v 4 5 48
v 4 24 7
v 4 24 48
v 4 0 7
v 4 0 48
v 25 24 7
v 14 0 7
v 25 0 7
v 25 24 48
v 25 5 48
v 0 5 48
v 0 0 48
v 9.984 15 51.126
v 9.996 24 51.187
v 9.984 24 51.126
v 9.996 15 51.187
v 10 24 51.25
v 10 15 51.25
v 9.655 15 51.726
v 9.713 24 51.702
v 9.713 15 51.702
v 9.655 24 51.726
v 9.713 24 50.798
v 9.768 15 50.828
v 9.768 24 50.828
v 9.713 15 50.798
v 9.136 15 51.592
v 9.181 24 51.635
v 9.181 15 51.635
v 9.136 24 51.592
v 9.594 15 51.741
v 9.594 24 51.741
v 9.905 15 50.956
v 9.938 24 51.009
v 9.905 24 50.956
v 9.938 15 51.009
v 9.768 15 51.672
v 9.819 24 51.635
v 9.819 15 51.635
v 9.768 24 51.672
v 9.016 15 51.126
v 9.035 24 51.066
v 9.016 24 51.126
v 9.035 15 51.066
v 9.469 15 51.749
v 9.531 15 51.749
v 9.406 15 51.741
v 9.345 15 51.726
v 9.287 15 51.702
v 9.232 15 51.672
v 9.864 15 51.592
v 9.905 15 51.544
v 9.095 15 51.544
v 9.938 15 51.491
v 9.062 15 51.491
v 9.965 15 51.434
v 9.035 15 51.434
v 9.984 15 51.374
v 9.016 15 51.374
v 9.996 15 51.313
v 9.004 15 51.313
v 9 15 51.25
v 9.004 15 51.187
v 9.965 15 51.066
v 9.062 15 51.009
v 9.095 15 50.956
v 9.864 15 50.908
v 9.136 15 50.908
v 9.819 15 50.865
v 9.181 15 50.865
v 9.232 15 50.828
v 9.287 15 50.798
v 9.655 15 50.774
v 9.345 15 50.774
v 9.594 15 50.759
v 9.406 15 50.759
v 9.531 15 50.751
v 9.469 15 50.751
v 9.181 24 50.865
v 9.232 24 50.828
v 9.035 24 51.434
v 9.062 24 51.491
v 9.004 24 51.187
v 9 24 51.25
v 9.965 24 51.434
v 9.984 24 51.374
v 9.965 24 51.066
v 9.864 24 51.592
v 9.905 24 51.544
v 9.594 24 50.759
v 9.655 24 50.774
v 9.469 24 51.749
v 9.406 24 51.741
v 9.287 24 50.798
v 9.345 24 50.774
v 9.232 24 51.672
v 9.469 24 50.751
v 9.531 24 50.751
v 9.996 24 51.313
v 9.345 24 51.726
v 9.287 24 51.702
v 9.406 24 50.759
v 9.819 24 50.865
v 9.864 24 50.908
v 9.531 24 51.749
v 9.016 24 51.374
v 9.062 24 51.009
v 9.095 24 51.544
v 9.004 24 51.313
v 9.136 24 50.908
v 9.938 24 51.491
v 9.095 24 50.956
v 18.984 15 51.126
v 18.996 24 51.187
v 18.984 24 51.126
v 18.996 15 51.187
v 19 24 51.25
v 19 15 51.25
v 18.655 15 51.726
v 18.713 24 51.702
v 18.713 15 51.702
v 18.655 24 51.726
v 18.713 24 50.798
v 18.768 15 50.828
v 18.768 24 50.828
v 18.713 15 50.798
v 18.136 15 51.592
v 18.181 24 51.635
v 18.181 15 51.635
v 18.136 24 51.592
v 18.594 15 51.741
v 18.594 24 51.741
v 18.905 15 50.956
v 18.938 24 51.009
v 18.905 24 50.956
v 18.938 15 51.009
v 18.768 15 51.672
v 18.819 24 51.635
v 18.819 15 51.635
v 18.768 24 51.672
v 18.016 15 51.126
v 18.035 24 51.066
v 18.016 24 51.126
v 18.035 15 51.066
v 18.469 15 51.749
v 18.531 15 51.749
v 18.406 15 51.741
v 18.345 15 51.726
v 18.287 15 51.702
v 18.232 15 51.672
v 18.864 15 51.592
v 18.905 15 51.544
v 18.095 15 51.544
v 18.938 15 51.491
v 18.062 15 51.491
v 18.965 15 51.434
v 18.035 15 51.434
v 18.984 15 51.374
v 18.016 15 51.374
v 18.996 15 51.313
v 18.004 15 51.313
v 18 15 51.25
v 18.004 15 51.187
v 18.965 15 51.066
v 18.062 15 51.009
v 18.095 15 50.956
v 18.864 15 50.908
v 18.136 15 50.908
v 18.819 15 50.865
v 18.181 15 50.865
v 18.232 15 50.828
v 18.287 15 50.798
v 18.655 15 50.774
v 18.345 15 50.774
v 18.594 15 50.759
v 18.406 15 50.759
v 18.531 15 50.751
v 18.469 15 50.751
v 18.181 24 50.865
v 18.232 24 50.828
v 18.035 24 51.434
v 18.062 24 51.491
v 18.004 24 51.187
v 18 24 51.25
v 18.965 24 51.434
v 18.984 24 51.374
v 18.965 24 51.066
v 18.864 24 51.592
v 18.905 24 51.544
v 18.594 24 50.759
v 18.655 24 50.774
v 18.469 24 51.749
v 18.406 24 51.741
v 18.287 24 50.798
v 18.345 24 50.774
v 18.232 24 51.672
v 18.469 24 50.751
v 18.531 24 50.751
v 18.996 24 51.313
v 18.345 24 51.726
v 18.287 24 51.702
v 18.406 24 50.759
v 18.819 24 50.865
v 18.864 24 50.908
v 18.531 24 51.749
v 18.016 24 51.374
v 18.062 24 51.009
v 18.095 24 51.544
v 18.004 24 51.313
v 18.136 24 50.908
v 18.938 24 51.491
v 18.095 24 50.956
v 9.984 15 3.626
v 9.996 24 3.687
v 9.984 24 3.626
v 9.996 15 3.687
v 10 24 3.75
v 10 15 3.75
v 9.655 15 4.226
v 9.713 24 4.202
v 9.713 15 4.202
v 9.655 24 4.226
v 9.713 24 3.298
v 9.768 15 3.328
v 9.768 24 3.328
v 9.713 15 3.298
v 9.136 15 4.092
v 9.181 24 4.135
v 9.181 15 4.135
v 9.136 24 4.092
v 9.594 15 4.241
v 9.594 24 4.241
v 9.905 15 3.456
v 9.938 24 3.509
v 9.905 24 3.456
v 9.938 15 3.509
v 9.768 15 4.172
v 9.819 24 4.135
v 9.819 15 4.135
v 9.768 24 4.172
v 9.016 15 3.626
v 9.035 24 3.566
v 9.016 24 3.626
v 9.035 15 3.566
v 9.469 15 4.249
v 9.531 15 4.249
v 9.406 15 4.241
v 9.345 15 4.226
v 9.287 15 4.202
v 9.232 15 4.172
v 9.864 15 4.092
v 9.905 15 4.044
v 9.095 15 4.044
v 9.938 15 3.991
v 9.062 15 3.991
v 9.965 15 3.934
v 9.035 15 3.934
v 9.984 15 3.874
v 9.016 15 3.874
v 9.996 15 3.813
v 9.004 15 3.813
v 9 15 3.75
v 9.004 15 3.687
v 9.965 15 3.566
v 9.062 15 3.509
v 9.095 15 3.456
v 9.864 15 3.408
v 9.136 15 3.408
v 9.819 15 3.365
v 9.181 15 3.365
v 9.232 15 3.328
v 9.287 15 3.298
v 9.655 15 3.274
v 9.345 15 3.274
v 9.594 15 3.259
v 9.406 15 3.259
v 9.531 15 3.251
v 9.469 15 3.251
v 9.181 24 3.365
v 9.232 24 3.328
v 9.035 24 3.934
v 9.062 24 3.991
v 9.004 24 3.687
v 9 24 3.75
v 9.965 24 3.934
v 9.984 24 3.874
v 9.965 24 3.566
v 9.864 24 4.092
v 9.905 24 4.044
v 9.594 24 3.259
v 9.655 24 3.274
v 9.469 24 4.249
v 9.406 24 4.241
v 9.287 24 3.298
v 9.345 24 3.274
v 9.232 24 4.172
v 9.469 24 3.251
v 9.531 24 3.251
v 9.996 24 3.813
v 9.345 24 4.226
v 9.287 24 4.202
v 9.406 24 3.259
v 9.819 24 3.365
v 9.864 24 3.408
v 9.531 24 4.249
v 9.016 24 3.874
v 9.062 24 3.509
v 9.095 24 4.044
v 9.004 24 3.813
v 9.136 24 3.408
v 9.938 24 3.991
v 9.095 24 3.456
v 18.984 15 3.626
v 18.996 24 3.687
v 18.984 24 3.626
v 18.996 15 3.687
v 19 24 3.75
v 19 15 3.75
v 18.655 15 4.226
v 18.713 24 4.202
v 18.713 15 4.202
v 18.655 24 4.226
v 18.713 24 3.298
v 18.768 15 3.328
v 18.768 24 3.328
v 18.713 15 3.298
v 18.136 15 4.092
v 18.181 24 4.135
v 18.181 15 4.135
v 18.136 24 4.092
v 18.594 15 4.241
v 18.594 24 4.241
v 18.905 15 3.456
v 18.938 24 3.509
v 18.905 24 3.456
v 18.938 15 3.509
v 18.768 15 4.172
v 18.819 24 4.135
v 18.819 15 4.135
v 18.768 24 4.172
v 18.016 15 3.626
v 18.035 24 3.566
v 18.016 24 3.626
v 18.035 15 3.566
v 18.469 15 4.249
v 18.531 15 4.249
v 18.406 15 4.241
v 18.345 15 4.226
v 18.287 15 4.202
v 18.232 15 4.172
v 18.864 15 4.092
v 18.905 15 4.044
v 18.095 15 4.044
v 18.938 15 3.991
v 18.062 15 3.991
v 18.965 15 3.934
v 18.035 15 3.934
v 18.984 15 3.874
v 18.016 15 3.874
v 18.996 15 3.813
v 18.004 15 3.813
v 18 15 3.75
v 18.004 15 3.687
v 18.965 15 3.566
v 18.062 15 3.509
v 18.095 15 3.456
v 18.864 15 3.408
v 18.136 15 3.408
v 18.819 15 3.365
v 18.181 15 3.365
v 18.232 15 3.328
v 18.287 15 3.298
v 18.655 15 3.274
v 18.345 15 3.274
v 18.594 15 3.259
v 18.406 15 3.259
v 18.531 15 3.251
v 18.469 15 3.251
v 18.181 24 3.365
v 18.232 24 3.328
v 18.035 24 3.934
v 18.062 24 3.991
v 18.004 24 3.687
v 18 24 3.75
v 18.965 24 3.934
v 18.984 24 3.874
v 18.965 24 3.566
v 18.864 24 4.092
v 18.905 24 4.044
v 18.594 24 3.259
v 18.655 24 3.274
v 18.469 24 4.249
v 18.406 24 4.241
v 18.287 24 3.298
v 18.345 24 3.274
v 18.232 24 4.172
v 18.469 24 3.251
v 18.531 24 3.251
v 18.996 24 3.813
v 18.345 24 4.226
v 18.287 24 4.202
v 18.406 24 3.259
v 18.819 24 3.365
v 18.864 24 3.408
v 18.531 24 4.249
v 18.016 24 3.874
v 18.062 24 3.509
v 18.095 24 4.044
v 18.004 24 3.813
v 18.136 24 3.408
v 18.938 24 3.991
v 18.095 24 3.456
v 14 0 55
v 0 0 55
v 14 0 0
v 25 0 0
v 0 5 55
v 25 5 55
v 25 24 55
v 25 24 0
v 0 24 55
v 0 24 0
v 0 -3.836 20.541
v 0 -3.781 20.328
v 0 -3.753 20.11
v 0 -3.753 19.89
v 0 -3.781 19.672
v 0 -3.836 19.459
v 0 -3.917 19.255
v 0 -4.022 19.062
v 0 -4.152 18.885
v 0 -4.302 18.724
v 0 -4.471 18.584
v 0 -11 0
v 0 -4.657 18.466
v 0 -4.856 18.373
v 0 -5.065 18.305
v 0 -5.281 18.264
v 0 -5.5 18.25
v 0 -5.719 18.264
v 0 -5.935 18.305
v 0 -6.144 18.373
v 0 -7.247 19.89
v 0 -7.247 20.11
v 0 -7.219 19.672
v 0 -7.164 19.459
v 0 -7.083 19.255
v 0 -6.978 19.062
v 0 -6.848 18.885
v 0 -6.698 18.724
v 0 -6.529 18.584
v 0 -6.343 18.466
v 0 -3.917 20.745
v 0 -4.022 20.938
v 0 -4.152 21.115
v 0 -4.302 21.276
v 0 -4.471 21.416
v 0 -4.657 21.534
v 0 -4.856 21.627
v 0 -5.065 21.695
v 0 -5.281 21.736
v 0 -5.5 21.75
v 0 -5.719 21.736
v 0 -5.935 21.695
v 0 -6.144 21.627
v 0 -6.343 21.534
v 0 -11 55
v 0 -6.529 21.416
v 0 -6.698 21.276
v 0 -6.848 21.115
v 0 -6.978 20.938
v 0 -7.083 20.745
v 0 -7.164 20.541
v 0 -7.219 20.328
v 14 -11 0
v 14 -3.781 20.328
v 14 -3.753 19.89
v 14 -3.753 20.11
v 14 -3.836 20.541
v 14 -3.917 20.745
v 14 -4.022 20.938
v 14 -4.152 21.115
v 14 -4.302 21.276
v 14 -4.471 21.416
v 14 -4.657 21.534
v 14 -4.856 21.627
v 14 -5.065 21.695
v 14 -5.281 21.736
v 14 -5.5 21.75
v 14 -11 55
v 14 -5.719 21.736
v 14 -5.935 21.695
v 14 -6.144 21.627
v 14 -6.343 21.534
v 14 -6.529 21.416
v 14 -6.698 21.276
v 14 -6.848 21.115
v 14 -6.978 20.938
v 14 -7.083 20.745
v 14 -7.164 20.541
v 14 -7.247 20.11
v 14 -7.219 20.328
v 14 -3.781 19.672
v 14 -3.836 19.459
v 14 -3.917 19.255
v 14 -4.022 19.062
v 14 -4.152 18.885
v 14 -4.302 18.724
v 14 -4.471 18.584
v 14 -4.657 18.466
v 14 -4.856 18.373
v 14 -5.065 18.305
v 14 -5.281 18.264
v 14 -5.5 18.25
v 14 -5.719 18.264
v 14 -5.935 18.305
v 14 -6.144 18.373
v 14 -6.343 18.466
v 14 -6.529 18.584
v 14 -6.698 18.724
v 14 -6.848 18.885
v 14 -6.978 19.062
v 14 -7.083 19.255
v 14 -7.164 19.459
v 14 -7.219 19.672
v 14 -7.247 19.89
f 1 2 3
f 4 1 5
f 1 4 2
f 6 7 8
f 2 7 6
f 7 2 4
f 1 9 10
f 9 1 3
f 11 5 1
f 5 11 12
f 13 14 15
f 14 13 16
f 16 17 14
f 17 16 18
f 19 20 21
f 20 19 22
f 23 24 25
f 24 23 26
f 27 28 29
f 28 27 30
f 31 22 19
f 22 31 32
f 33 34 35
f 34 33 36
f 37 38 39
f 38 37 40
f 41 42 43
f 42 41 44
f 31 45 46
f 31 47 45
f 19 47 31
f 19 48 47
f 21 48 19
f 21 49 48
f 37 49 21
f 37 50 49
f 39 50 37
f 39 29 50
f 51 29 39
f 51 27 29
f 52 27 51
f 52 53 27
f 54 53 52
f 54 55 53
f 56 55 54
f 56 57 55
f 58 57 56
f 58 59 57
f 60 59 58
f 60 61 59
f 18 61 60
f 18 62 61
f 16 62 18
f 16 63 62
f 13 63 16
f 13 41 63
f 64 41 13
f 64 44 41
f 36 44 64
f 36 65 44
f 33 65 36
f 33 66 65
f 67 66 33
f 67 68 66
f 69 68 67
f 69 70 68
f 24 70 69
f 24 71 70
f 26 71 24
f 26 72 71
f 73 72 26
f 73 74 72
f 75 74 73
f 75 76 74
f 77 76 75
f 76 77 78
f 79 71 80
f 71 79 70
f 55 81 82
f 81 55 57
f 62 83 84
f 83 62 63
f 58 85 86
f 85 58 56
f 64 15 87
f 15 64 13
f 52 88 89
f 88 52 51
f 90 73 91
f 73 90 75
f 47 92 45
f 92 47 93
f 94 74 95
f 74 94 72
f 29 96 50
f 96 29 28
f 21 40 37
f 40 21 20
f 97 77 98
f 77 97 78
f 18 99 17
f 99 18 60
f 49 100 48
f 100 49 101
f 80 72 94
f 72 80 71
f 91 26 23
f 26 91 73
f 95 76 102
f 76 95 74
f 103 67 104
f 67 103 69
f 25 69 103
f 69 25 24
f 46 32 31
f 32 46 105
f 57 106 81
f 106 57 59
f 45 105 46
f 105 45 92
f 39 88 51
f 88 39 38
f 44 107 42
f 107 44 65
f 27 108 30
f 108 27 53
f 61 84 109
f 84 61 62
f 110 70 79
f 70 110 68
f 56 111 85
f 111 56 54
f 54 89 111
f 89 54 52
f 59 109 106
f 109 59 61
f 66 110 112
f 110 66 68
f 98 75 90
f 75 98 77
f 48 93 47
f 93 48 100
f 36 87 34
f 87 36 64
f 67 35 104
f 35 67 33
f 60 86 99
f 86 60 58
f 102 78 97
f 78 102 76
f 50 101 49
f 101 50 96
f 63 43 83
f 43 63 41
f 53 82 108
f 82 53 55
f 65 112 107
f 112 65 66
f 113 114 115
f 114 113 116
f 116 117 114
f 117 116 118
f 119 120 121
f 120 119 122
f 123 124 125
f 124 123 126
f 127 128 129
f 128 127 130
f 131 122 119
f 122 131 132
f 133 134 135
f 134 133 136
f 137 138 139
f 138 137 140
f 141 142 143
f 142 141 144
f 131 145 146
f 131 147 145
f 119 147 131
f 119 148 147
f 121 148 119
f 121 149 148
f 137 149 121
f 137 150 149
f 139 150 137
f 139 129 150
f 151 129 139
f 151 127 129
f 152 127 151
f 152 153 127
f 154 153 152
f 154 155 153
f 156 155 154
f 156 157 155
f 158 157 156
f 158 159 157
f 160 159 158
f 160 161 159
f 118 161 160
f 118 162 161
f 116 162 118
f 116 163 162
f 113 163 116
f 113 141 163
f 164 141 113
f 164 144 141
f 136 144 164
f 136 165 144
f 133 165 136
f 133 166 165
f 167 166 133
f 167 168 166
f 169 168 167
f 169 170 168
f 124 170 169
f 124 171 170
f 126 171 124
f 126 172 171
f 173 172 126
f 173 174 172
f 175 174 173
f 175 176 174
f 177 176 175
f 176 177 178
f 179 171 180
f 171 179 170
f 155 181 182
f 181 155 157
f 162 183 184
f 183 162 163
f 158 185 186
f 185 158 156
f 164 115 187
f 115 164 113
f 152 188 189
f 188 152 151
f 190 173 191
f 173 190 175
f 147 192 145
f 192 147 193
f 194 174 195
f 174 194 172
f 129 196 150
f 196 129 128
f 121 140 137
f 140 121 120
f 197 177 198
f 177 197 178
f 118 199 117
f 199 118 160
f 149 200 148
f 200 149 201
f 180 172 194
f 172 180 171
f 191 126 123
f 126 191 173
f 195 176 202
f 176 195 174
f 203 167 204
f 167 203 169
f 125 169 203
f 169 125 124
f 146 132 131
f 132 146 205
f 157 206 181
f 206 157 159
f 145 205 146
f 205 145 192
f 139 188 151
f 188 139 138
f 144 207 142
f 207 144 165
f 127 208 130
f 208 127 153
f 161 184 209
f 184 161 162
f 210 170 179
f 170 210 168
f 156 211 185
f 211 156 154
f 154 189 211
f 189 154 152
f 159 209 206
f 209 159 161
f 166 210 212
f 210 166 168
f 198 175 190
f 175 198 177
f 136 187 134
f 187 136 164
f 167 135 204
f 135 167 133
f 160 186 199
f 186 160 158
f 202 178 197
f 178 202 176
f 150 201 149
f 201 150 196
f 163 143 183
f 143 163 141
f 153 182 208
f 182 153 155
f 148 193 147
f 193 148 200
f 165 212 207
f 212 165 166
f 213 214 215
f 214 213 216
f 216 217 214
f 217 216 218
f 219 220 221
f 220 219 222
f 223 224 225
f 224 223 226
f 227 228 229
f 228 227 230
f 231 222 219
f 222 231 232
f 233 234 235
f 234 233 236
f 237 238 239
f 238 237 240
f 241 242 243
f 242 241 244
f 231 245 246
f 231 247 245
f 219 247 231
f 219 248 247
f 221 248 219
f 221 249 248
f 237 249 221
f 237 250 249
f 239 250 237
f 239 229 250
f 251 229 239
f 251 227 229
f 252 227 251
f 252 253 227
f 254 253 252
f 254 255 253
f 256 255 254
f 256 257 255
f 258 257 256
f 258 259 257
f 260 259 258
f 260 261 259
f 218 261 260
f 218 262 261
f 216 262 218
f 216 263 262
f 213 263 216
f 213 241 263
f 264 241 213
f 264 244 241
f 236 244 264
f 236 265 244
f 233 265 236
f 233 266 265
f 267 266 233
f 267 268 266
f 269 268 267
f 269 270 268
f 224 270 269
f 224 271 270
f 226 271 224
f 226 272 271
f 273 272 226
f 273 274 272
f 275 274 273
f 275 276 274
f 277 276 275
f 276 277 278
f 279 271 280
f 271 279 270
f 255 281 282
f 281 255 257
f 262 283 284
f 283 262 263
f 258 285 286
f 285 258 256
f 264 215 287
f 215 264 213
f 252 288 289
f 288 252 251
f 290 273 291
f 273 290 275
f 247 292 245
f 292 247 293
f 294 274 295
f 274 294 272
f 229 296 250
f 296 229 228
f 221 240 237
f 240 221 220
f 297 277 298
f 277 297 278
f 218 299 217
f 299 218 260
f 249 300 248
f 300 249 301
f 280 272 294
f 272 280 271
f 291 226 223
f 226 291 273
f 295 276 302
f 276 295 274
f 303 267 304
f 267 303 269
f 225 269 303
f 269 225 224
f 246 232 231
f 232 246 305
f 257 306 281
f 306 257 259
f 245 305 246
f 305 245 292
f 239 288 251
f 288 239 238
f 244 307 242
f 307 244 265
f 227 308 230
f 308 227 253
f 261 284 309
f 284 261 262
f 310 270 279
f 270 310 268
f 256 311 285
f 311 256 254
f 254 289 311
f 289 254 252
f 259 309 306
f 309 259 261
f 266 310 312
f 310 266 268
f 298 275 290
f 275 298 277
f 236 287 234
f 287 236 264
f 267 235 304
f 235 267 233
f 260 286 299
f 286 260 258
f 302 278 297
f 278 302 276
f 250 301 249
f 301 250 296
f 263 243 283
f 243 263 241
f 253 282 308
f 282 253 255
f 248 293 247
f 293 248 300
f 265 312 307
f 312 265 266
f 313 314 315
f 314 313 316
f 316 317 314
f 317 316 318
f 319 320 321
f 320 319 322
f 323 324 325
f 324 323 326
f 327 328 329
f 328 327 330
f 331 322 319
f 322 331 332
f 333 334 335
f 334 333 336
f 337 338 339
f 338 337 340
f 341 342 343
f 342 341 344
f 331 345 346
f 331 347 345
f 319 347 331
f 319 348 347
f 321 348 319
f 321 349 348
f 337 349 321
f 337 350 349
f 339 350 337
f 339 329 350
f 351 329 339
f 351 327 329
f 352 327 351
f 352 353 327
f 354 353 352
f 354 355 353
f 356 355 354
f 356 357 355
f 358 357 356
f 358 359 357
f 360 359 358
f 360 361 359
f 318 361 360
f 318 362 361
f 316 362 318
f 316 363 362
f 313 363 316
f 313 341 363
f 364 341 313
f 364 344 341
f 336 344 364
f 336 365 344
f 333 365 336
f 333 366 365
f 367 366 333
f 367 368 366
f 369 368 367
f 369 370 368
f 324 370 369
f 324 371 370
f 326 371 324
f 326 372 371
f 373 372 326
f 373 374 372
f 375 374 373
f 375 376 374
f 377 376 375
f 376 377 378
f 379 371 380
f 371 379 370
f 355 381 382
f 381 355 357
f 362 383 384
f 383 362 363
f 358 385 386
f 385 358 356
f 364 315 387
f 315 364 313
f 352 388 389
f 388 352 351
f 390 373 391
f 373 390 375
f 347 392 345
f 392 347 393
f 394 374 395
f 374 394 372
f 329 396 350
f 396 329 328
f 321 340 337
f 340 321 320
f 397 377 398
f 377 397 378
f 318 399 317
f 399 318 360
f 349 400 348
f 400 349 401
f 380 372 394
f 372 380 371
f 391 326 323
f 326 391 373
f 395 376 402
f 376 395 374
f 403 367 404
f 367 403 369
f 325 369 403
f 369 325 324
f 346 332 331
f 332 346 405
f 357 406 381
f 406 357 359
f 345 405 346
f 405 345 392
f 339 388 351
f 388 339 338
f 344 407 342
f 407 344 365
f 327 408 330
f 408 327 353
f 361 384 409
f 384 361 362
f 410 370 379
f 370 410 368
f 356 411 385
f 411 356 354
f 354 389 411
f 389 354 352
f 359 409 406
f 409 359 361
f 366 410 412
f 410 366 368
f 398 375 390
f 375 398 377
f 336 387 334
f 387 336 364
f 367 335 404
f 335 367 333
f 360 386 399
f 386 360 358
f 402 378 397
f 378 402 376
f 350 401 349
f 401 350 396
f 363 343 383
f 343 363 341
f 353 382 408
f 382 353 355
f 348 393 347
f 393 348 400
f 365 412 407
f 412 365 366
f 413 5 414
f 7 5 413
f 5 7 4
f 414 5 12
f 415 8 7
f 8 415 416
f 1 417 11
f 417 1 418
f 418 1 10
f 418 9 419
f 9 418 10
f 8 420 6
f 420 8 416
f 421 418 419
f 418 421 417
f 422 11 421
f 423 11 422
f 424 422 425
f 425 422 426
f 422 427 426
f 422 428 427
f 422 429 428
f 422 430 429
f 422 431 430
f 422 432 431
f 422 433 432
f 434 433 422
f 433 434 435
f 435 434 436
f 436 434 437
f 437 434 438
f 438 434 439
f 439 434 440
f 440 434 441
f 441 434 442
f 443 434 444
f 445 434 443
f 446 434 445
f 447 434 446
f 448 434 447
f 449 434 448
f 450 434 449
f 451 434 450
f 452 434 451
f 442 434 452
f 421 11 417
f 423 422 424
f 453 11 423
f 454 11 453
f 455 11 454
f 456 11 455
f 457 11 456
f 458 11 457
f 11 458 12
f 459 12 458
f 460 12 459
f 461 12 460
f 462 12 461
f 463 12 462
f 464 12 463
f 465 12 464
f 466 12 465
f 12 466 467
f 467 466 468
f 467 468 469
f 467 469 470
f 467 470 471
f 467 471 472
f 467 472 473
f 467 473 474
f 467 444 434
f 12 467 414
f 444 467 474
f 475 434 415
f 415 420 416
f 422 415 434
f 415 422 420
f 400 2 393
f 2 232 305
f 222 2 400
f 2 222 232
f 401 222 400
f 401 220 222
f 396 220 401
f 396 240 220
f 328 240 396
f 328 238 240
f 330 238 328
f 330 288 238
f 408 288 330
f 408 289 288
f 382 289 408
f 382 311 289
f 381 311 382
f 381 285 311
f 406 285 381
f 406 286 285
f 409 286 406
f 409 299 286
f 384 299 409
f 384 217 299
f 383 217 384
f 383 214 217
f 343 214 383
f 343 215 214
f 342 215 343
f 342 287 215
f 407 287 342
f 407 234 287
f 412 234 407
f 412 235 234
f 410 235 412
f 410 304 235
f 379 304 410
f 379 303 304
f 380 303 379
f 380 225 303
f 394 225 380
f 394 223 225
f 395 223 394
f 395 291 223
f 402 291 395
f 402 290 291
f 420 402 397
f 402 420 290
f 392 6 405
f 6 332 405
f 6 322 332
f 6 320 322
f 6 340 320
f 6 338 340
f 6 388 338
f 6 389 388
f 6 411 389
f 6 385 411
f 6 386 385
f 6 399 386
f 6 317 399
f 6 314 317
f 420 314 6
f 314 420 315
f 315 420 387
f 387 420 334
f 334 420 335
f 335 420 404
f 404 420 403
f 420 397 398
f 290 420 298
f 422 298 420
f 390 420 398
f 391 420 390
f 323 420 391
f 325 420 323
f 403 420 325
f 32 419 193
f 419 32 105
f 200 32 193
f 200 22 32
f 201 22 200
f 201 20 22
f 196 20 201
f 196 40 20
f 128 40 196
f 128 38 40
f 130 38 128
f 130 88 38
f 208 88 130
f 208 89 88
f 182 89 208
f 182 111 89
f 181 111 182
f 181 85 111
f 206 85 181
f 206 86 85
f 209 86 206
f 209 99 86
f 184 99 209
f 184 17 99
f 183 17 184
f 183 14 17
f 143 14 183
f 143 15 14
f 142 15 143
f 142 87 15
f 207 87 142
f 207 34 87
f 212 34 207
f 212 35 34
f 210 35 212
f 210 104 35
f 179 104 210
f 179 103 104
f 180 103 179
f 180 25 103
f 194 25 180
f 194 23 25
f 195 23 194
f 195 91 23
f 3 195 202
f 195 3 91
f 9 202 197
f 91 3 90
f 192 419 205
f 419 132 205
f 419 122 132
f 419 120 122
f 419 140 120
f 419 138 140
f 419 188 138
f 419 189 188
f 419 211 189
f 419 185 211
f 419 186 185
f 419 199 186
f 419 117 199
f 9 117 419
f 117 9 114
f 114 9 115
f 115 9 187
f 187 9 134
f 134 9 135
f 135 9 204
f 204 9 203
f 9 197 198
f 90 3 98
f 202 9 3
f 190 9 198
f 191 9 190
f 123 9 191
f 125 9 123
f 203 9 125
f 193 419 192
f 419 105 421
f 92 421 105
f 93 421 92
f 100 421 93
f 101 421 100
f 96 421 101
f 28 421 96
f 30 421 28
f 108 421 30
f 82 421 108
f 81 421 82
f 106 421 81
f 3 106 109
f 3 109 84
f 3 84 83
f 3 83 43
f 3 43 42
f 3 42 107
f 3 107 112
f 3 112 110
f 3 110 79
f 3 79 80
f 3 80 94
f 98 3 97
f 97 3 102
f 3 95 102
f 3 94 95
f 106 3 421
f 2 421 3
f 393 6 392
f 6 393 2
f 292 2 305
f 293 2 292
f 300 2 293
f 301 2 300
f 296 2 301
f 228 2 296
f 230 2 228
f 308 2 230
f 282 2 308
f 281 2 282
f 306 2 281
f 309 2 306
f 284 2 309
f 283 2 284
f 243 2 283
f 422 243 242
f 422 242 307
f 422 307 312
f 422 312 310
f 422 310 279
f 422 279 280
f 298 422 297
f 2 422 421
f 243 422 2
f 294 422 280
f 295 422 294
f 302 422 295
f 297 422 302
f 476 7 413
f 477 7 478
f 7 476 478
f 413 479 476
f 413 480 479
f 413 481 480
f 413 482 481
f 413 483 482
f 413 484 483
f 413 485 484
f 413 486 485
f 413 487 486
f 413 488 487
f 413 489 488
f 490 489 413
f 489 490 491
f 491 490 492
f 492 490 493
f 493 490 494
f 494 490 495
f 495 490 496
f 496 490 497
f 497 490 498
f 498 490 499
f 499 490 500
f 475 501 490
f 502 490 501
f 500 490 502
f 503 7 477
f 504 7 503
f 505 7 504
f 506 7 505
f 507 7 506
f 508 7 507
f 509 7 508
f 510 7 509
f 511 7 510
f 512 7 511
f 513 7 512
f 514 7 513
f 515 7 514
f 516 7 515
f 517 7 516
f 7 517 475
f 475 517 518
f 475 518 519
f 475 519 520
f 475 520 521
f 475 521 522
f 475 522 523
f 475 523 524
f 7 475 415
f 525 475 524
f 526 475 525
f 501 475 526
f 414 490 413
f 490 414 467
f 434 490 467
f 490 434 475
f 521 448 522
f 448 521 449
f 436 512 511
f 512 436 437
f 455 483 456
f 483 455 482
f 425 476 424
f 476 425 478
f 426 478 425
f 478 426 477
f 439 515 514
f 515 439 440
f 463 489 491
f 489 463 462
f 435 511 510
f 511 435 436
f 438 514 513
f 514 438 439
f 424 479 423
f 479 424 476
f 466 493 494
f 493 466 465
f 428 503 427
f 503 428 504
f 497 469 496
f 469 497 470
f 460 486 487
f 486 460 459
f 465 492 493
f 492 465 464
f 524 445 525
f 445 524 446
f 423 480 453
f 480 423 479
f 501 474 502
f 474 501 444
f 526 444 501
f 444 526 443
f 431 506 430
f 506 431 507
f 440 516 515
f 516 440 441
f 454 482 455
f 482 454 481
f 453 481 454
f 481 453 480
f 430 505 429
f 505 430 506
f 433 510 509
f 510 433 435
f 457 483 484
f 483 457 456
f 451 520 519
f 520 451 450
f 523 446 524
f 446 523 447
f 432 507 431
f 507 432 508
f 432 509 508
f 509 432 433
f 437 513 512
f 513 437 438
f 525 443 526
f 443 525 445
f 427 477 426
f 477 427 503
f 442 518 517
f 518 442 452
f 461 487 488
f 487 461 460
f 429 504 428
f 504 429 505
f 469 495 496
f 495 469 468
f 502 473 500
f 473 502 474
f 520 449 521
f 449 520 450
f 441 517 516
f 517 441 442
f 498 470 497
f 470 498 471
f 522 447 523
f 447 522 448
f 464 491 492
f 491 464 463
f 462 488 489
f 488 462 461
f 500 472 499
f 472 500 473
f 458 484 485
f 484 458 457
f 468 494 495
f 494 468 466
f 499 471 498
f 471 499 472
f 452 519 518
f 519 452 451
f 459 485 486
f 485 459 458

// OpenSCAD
// file: ../../Modèles/Servo.scad
module vis_servo(l) {
    cylinder(d=1,5, h=10);
}

module servo() {
    translate([0,0,0])       cube([20,41,36]);
    translate([0,-6.5,23.5]) cube([20,54,10]);

	translate([ 5.5,  -3.25,14]) vis_servo();
	translate([14.5,  -3.25,14]) vis_servo();
	translate([ 5.5,41+3.25,14]) vis_servo();
	translate([14.5,41+3.25,14]) vis_servo();

    translate([10,10,36]) cylinder(d=15, h=2);
}
// main file
$fn=50;

include <../../Modèles/Servo.scad>

module porte_servo() {
    difference() {
        cube([25, 24, 55]);
        union() {

            translate([4,1,48])rotate([-90,0,0])servo();
            translate([23,0,7]) cube([21,25,41]);
            translate([4,0,7])  cube([21,5,41]);
            translate([0,0,48]) cube([25,5,7]);
        }
    }

    difference() {
        translate([0,-11,0]) cube([14, 11, 55]);
        // Impression directe
        //translate([-1,-5.5,22]) rotate([0,90,0])cylinder(100, d=3.5);
        // Impression retournée
        translate([-1,-5.5,20]) rotate([0,90,0])cylinder(100, d=3.5);
    }
}
module porte_servo_avec_servo() {
    porte_servo();
    translate([4,1,48])rotate([-90,0,0])servo();
}
porte_servo();
